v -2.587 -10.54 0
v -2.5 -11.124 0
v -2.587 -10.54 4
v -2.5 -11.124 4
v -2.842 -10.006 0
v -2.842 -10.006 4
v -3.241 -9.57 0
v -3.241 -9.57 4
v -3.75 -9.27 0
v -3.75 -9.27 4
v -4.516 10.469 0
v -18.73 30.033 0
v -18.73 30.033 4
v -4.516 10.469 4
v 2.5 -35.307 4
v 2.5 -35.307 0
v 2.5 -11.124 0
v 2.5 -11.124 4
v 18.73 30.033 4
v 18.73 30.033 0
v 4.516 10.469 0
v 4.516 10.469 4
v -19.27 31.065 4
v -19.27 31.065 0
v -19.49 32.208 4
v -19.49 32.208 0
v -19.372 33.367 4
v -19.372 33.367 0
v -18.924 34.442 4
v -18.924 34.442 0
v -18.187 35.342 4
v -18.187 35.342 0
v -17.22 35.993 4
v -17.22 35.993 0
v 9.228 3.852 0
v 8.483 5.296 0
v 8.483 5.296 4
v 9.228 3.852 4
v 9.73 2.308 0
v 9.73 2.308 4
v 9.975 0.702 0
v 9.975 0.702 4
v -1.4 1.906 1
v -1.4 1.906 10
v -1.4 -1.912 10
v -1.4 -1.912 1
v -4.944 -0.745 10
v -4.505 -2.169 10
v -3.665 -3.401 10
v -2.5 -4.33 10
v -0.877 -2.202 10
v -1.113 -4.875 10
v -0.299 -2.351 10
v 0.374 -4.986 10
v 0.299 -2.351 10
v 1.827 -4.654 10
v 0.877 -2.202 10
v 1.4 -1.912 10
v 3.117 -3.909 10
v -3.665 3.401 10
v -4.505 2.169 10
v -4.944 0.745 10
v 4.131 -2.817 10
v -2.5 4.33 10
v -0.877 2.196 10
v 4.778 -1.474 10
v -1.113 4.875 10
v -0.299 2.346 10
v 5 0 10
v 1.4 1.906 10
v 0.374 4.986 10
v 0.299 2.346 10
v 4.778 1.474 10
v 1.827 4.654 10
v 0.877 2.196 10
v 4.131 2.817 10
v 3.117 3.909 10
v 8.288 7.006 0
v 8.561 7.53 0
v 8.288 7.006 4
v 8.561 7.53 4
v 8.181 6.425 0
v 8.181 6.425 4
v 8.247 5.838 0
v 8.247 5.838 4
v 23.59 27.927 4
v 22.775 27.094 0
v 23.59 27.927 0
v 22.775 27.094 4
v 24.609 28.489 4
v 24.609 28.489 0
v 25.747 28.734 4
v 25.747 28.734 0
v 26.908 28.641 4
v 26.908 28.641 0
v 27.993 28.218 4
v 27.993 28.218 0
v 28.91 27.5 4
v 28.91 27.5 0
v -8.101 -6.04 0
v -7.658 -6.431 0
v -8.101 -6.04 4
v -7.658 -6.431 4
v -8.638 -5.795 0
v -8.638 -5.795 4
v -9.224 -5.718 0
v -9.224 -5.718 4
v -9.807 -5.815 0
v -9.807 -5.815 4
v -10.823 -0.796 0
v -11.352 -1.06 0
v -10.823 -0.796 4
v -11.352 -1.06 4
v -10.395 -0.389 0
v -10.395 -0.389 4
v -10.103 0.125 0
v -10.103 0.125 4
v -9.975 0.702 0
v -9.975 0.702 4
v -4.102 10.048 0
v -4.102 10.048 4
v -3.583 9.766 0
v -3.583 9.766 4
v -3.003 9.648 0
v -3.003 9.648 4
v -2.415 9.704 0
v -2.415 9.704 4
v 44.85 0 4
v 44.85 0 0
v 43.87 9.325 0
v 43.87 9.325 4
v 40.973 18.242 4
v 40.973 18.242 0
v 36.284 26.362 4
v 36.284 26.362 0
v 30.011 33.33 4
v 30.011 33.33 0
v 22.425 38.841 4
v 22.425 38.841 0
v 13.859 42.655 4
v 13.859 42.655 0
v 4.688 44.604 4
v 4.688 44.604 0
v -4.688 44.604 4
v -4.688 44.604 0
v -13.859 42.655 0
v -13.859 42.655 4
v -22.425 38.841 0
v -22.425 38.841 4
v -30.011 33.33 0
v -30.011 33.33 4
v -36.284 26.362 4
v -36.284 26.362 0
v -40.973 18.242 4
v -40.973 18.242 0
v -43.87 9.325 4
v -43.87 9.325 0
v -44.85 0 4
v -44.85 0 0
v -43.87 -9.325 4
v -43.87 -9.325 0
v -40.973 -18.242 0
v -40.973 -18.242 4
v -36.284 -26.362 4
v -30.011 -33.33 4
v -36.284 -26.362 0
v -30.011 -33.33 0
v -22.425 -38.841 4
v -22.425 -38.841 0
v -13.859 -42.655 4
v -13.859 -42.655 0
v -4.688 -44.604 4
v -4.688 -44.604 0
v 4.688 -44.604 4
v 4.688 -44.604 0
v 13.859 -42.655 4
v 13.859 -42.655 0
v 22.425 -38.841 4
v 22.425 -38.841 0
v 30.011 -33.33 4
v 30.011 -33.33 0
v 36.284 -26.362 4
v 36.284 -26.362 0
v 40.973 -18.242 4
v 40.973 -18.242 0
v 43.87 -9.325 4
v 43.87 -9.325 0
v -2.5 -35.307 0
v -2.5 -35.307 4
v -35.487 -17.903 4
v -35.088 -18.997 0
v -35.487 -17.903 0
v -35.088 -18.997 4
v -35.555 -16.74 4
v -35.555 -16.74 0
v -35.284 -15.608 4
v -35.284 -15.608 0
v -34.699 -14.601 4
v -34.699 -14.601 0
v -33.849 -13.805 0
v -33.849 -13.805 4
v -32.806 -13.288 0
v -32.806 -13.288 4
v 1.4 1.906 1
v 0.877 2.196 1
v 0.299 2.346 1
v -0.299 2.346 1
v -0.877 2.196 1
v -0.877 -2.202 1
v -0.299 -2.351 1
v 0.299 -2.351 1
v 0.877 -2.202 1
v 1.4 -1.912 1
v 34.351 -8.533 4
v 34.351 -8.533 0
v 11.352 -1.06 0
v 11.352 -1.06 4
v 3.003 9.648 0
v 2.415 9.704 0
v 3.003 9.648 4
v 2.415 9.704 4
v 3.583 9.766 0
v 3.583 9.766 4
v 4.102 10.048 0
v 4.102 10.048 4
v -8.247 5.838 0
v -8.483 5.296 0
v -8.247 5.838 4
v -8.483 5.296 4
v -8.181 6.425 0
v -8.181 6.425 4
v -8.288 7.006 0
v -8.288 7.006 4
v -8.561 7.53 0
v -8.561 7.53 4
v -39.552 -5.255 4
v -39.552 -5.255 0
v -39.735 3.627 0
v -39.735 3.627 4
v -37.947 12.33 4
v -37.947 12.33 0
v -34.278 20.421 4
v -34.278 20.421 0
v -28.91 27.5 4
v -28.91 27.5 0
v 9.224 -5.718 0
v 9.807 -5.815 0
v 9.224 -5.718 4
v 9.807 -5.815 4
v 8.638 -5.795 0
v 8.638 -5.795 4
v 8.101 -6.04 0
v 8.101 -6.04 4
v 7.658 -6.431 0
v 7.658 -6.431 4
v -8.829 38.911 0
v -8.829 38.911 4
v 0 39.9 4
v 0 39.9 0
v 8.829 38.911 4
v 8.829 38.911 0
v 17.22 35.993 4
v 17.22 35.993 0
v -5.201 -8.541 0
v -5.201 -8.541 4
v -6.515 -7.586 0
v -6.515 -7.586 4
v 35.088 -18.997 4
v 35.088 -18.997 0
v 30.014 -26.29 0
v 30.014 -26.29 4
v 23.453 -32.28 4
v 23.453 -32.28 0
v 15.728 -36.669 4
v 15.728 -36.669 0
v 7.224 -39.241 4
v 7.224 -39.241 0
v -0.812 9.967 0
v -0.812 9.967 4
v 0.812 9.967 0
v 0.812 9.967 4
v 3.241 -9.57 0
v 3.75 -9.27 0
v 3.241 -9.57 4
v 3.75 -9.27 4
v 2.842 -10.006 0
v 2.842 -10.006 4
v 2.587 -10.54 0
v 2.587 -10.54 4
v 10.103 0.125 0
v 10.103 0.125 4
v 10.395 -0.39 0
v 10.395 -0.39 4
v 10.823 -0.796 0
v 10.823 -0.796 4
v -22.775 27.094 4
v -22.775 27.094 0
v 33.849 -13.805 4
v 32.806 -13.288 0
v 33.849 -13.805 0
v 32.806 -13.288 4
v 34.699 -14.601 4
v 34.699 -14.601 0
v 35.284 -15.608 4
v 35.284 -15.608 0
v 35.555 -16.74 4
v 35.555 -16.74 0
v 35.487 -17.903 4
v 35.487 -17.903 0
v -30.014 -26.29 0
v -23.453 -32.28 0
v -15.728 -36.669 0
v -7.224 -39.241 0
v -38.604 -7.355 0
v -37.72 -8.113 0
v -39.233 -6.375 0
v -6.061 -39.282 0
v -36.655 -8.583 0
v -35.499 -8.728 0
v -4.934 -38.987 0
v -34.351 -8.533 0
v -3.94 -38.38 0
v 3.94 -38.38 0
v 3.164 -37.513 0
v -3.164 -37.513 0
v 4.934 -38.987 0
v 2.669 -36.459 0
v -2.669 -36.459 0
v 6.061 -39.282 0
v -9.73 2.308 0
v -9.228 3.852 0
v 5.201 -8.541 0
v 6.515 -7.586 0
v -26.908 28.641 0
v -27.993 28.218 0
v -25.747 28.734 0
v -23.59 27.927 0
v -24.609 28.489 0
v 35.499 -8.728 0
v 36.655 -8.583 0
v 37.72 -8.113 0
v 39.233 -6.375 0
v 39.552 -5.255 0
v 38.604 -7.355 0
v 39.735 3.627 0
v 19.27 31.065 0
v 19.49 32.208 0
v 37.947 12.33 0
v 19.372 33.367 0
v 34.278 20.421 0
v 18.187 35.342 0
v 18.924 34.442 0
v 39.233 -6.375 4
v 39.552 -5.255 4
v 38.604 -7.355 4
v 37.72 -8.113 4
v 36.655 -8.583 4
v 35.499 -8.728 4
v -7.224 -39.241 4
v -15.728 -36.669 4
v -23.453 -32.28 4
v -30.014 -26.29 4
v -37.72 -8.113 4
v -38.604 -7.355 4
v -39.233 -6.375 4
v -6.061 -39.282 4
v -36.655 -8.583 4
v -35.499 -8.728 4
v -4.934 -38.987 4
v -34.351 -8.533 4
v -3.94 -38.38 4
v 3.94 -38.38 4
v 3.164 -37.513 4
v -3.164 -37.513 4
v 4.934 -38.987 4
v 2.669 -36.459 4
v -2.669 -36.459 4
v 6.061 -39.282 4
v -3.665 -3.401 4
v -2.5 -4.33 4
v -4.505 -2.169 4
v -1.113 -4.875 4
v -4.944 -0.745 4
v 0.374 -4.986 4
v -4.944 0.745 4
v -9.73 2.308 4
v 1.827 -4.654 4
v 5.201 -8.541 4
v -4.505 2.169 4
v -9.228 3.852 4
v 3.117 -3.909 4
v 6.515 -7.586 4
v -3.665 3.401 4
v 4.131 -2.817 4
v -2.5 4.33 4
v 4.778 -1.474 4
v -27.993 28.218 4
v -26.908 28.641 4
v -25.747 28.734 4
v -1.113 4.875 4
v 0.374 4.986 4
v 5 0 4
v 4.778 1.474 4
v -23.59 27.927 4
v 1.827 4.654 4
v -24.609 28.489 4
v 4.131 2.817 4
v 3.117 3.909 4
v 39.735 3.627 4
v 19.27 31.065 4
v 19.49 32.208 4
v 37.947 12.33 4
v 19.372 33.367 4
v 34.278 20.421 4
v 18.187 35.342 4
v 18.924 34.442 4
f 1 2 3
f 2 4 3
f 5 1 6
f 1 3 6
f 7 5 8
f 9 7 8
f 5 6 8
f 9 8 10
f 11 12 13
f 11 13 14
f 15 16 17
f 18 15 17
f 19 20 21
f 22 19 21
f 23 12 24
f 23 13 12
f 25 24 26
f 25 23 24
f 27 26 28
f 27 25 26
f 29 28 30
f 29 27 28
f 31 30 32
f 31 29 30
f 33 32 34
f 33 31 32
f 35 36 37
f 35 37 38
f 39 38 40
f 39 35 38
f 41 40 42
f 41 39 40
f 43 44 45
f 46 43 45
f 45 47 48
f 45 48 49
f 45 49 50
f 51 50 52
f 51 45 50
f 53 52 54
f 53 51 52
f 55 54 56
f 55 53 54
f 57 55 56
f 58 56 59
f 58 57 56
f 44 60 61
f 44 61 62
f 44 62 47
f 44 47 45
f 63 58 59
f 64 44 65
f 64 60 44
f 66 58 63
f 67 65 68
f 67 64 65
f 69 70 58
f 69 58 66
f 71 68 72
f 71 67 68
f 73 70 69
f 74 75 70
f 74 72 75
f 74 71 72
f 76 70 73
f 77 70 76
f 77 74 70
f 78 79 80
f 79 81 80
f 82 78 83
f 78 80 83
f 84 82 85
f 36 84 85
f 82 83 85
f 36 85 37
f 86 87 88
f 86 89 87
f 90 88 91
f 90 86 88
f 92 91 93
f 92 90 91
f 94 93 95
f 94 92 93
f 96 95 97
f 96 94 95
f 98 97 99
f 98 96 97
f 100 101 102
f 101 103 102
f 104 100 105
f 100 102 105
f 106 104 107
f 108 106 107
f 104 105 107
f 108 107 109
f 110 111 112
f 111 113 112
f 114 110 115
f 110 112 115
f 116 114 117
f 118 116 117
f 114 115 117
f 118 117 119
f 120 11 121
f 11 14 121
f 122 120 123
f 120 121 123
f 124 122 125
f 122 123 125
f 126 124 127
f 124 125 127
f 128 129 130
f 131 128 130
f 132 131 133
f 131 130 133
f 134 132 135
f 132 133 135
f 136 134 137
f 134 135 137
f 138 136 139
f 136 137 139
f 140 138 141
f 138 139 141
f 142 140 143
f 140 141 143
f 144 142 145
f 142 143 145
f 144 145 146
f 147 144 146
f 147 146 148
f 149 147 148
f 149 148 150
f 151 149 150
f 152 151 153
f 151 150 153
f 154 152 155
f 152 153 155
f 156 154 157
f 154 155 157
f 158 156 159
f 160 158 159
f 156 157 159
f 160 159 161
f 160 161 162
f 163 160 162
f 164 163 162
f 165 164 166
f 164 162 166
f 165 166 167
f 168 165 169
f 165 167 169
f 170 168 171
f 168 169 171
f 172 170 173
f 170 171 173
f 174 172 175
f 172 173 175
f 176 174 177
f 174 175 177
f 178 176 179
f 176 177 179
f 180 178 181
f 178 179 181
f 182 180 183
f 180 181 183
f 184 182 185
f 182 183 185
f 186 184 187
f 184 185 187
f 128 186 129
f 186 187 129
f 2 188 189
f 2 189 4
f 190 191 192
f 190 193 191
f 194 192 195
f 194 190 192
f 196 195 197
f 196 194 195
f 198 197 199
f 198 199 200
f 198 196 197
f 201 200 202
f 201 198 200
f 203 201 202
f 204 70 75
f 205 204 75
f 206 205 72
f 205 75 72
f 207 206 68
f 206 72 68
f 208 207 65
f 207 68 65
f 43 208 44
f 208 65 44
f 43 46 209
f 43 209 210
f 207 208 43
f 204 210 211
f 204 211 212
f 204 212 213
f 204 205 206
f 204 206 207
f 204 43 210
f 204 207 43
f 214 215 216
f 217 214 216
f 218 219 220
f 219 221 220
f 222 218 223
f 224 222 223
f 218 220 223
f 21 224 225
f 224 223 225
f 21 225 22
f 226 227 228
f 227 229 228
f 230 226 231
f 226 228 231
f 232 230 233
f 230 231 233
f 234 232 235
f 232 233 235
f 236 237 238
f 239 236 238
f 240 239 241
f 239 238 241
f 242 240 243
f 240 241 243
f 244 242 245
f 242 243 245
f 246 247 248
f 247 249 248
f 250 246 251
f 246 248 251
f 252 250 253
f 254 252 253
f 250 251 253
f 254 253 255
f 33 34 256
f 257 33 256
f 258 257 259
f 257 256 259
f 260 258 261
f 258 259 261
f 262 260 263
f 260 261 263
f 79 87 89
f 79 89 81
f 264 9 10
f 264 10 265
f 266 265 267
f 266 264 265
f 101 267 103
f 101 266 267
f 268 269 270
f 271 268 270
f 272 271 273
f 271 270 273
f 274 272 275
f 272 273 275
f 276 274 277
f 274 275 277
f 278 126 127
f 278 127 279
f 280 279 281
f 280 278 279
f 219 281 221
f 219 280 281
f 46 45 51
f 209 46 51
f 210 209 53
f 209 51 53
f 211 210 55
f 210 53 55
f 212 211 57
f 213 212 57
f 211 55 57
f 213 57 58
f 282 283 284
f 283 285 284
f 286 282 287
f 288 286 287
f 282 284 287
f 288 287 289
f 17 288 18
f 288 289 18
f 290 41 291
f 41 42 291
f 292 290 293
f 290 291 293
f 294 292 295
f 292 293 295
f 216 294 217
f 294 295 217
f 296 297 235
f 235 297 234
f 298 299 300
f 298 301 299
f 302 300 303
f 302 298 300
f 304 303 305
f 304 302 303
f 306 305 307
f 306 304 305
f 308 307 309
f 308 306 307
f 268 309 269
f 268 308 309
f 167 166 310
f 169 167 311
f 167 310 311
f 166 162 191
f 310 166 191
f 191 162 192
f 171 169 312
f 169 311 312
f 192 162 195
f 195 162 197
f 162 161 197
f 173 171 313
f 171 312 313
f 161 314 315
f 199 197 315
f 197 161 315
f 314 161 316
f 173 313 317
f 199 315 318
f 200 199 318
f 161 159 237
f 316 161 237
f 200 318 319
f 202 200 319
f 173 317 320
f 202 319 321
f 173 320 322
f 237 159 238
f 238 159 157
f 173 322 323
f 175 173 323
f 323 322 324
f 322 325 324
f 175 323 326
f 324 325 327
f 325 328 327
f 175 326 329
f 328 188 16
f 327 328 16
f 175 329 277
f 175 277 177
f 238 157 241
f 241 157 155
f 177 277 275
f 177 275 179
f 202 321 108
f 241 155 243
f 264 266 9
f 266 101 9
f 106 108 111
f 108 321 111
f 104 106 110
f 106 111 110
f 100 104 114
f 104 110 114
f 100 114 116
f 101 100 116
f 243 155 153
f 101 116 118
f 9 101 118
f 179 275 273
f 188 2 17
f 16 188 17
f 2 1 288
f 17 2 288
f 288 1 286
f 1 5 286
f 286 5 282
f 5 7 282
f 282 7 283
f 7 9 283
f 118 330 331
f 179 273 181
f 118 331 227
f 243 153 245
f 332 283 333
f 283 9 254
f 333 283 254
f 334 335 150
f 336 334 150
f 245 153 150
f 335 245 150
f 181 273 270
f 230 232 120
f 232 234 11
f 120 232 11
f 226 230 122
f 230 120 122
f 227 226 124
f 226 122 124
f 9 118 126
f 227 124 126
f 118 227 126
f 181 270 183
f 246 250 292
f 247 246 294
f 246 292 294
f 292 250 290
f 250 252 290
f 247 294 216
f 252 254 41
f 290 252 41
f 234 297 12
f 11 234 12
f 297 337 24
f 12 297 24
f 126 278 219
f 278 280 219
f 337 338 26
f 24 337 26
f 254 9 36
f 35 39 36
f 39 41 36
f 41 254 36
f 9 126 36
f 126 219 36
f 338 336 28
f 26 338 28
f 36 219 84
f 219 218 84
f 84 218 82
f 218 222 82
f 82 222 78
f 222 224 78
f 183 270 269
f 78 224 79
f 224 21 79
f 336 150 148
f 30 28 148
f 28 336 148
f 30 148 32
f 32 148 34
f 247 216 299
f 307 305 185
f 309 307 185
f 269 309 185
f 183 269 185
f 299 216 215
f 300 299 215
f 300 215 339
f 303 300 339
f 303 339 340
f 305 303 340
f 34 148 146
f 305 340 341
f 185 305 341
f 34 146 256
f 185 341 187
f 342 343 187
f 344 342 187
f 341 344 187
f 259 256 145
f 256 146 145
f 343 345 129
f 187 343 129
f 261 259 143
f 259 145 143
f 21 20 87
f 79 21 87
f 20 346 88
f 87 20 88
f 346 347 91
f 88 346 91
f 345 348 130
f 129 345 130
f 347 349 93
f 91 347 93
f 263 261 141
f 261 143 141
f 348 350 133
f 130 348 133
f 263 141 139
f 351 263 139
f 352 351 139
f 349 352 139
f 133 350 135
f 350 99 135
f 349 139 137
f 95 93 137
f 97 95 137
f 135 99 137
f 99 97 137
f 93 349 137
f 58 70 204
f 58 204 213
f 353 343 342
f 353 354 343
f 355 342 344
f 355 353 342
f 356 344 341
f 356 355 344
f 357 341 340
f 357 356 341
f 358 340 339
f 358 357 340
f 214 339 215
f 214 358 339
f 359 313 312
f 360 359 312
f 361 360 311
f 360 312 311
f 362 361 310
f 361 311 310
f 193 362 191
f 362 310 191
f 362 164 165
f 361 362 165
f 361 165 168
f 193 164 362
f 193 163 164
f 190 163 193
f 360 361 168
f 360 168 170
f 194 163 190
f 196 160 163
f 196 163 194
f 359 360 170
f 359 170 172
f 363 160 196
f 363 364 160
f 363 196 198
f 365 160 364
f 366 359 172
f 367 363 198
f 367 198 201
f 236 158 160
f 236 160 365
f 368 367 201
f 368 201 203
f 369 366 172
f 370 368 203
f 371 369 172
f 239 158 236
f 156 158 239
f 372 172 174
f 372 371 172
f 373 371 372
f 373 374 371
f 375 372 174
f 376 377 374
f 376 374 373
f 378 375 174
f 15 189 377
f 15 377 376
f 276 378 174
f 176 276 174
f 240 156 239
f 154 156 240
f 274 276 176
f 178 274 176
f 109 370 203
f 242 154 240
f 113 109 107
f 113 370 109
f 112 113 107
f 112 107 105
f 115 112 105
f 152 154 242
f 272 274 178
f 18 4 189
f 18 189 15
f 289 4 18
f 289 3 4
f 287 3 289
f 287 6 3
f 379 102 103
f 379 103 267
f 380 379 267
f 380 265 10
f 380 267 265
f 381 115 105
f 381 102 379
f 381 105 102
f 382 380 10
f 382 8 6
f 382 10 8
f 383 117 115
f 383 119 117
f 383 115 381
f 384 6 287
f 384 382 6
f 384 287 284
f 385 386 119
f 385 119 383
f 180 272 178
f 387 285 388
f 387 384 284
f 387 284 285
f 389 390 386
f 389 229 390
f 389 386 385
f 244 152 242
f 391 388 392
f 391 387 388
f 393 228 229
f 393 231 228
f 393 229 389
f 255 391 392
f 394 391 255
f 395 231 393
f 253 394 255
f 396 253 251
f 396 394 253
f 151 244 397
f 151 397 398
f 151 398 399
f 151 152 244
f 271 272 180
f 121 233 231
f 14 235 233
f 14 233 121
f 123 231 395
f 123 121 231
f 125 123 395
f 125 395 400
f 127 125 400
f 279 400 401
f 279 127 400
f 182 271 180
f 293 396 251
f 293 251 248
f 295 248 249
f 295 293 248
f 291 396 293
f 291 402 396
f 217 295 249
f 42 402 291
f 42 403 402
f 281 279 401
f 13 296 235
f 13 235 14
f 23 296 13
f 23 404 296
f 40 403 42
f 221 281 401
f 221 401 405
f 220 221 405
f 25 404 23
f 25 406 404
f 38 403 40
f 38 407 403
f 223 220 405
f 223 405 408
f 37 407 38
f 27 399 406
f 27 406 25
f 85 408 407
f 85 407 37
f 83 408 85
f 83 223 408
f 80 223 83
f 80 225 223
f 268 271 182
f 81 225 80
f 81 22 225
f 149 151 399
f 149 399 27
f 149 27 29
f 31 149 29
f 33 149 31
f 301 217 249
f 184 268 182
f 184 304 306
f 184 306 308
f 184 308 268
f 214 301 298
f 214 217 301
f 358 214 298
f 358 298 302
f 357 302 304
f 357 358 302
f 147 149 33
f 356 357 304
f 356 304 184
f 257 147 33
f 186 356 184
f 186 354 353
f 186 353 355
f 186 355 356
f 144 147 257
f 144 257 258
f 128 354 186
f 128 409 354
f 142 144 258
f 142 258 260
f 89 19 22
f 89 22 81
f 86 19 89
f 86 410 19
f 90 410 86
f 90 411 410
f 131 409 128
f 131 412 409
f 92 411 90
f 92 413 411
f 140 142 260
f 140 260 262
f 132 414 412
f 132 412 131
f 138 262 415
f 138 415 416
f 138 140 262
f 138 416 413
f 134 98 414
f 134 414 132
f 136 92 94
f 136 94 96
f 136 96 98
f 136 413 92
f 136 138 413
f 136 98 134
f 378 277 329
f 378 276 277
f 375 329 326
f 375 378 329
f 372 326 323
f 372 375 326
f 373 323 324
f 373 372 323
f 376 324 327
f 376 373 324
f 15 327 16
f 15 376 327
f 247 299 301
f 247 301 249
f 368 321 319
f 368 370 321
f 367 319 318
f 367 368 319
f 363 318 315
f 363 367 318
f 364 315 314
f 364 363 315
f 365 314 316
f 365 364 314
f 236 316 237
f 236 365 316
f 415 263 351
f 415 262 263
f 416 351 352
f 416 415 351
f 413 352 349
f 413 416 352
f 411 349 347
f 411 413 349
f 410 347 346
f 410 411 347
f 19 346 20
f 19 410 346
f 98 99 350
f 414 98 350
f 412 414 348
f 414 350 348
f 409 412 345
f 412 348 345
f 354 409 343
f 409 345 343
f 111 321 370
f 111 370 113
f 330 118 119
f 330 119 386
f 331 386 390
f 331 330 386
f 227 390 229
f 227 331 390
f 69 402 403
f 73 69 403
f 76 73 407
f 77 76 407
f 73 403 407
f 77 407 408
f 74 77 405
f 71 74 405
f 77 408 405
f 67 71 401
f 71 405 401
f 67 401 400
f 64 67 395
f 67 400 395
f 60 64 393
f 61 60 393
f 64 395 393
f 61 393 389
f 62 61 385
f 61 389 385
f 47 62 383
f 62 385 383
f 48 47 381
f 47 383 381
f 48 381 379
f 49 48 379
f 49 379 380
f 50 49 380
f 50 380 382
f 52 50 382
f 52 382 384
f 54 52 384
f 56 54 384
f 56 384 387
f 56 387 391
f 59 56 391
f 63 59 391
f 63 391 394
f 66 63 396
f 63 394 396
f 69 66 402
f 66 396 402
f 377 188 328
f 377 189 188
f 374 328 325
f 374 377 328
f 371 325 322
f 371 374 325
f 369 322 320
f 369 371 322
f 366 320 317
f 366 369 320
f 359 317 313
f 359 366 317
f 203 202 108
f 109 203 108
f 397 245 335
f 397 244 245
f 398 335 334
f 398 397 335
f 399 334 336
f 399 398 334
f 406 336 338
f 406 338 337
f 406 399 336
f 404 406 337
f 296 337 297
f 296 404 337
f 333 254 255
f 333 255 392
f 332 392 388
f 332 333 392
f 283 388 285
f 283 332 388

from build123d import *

# Parameters (mm, degrees)
SKETCH_R           = 44.85
PAD_DEPTH          = 4
POCKET_DEPTH       = 4
POLARPATTERN_COUNT = 5
SKETCH003_R        = 5
PAD001_DEPTH       = 6
POCKET001_DEPTH    = 9
FILLET_R           = 2
FILLET001_R        = 4


with BuildPart() as part:
    # Sketch → Pad (new body)
    with BuildSketch(Plane.XY):
        Circle(SKETCH_R)
    extrude(amount=PAD_DEPTH)

    # Sketch002 (on Face2 of Pad) → Pocket (cut)
    with BuildSketch(Plane(origin=(0, 0, 0), x_dir=(1, 0, 0), z_dir=(0, 0, -1))):
        with BuildLine():
            Line((-2.5, 39.821602), (-2.5, 9.682458))
            ThreePointArc((-2.5, 9.682458), (-5.877853, 8.09017), (-8.436023, 5.369685))
            Line((-37.100052, 14.683193), (-8.436023, 5.369685))
            ThreePointArc((-2.5, 39.821602), (-23.452632, 32.279778), (-37.100052, 14.683193))
        make_face()
    pocket = extrude(amount=-POCKET_DEPTH, mode=Mode.SUBTRACT)

    # PolarPattern: Pocket ×5 about axis
    polarpattern_axis = Axis((0, 0, 0), (0, 0, -1))
    for i in range(1, POLARPATTERN_COUNT):
        add(pocket.rotate(polarpattern_axis, i * 360 / POLARPATTERN_COUNT), mode=Mode.SUBTRACT)

    # Sketch003 (on Face3 of PolarPattern) → Pad001 (join)
    with BuildSketch(Plane.XY.offset(4)):
        Circle(SKETCH003_R)
    extrude(amount=PAD001_DEPTH)

    # Sketch004 (on Face25 of Pad001) → Pocket001 (cut)
    with BuildSketch(Plane.XY.offset(10)):
        with BuildLine():
            Line((-1.4, 1.906102), (-1.4, -1.912302))
            ThreePointArc((-1.4, -1.912302), (0, -2.37), (1.4, -1.912302))
            Line((1.4, 1.906102), (1.4, -1.912302))
            ThreePointArc((1.4, 1.906102), (0, 2.365), (-1.4, 1.906102))
        make_face()
    extrude(amount=-POCKET001_DEPTH, mode=Mode.SUBTRACT)

    # Fillet
    fillet_edges = [part.edges().sort_by_distance(p)[0] for p in [
        (-3.668664, 9.302736, 2),
        (3.668664, 9.302736, 2),
        (-7.713749, 6.36381, 2),
        (-9.981108, -0.614403, 2),
        (-8.436023, -5.369685, 2),
        (2.5, -9.682458, 2),
        (8.436023, -5.369685, 2),
        (-2.5, -9.682458, 2),
        (9.981108, -0.614403, 2),
        (7.713749, 6.36381, 2),
    ]]
    fillet(fillet_edges, radius=FILLET_R)

    # Fillet001
    fillet001_edges = [part.edges().sort_by_distance(p)[0] for p in [
        (-38.645137, -9.927911, 2),
        (-25.429093, 30.74689, 2),
        (21.384008, 33.685816, 2),
        (37.100052, -14.683193, 2),
        (-2.5, -39.821602, 2),
        (-37.100052, -14.683193, 2),
        (2.5, -39.821602, 2),
        (25.429093, 30.74689, 2),
        (38.645137, -9.927911, 2),
        (-21.384008, 33.685816, 2),
    ]]
    fillet(fillet001_edges, radius=FILLET001_R)


solid = part.part
